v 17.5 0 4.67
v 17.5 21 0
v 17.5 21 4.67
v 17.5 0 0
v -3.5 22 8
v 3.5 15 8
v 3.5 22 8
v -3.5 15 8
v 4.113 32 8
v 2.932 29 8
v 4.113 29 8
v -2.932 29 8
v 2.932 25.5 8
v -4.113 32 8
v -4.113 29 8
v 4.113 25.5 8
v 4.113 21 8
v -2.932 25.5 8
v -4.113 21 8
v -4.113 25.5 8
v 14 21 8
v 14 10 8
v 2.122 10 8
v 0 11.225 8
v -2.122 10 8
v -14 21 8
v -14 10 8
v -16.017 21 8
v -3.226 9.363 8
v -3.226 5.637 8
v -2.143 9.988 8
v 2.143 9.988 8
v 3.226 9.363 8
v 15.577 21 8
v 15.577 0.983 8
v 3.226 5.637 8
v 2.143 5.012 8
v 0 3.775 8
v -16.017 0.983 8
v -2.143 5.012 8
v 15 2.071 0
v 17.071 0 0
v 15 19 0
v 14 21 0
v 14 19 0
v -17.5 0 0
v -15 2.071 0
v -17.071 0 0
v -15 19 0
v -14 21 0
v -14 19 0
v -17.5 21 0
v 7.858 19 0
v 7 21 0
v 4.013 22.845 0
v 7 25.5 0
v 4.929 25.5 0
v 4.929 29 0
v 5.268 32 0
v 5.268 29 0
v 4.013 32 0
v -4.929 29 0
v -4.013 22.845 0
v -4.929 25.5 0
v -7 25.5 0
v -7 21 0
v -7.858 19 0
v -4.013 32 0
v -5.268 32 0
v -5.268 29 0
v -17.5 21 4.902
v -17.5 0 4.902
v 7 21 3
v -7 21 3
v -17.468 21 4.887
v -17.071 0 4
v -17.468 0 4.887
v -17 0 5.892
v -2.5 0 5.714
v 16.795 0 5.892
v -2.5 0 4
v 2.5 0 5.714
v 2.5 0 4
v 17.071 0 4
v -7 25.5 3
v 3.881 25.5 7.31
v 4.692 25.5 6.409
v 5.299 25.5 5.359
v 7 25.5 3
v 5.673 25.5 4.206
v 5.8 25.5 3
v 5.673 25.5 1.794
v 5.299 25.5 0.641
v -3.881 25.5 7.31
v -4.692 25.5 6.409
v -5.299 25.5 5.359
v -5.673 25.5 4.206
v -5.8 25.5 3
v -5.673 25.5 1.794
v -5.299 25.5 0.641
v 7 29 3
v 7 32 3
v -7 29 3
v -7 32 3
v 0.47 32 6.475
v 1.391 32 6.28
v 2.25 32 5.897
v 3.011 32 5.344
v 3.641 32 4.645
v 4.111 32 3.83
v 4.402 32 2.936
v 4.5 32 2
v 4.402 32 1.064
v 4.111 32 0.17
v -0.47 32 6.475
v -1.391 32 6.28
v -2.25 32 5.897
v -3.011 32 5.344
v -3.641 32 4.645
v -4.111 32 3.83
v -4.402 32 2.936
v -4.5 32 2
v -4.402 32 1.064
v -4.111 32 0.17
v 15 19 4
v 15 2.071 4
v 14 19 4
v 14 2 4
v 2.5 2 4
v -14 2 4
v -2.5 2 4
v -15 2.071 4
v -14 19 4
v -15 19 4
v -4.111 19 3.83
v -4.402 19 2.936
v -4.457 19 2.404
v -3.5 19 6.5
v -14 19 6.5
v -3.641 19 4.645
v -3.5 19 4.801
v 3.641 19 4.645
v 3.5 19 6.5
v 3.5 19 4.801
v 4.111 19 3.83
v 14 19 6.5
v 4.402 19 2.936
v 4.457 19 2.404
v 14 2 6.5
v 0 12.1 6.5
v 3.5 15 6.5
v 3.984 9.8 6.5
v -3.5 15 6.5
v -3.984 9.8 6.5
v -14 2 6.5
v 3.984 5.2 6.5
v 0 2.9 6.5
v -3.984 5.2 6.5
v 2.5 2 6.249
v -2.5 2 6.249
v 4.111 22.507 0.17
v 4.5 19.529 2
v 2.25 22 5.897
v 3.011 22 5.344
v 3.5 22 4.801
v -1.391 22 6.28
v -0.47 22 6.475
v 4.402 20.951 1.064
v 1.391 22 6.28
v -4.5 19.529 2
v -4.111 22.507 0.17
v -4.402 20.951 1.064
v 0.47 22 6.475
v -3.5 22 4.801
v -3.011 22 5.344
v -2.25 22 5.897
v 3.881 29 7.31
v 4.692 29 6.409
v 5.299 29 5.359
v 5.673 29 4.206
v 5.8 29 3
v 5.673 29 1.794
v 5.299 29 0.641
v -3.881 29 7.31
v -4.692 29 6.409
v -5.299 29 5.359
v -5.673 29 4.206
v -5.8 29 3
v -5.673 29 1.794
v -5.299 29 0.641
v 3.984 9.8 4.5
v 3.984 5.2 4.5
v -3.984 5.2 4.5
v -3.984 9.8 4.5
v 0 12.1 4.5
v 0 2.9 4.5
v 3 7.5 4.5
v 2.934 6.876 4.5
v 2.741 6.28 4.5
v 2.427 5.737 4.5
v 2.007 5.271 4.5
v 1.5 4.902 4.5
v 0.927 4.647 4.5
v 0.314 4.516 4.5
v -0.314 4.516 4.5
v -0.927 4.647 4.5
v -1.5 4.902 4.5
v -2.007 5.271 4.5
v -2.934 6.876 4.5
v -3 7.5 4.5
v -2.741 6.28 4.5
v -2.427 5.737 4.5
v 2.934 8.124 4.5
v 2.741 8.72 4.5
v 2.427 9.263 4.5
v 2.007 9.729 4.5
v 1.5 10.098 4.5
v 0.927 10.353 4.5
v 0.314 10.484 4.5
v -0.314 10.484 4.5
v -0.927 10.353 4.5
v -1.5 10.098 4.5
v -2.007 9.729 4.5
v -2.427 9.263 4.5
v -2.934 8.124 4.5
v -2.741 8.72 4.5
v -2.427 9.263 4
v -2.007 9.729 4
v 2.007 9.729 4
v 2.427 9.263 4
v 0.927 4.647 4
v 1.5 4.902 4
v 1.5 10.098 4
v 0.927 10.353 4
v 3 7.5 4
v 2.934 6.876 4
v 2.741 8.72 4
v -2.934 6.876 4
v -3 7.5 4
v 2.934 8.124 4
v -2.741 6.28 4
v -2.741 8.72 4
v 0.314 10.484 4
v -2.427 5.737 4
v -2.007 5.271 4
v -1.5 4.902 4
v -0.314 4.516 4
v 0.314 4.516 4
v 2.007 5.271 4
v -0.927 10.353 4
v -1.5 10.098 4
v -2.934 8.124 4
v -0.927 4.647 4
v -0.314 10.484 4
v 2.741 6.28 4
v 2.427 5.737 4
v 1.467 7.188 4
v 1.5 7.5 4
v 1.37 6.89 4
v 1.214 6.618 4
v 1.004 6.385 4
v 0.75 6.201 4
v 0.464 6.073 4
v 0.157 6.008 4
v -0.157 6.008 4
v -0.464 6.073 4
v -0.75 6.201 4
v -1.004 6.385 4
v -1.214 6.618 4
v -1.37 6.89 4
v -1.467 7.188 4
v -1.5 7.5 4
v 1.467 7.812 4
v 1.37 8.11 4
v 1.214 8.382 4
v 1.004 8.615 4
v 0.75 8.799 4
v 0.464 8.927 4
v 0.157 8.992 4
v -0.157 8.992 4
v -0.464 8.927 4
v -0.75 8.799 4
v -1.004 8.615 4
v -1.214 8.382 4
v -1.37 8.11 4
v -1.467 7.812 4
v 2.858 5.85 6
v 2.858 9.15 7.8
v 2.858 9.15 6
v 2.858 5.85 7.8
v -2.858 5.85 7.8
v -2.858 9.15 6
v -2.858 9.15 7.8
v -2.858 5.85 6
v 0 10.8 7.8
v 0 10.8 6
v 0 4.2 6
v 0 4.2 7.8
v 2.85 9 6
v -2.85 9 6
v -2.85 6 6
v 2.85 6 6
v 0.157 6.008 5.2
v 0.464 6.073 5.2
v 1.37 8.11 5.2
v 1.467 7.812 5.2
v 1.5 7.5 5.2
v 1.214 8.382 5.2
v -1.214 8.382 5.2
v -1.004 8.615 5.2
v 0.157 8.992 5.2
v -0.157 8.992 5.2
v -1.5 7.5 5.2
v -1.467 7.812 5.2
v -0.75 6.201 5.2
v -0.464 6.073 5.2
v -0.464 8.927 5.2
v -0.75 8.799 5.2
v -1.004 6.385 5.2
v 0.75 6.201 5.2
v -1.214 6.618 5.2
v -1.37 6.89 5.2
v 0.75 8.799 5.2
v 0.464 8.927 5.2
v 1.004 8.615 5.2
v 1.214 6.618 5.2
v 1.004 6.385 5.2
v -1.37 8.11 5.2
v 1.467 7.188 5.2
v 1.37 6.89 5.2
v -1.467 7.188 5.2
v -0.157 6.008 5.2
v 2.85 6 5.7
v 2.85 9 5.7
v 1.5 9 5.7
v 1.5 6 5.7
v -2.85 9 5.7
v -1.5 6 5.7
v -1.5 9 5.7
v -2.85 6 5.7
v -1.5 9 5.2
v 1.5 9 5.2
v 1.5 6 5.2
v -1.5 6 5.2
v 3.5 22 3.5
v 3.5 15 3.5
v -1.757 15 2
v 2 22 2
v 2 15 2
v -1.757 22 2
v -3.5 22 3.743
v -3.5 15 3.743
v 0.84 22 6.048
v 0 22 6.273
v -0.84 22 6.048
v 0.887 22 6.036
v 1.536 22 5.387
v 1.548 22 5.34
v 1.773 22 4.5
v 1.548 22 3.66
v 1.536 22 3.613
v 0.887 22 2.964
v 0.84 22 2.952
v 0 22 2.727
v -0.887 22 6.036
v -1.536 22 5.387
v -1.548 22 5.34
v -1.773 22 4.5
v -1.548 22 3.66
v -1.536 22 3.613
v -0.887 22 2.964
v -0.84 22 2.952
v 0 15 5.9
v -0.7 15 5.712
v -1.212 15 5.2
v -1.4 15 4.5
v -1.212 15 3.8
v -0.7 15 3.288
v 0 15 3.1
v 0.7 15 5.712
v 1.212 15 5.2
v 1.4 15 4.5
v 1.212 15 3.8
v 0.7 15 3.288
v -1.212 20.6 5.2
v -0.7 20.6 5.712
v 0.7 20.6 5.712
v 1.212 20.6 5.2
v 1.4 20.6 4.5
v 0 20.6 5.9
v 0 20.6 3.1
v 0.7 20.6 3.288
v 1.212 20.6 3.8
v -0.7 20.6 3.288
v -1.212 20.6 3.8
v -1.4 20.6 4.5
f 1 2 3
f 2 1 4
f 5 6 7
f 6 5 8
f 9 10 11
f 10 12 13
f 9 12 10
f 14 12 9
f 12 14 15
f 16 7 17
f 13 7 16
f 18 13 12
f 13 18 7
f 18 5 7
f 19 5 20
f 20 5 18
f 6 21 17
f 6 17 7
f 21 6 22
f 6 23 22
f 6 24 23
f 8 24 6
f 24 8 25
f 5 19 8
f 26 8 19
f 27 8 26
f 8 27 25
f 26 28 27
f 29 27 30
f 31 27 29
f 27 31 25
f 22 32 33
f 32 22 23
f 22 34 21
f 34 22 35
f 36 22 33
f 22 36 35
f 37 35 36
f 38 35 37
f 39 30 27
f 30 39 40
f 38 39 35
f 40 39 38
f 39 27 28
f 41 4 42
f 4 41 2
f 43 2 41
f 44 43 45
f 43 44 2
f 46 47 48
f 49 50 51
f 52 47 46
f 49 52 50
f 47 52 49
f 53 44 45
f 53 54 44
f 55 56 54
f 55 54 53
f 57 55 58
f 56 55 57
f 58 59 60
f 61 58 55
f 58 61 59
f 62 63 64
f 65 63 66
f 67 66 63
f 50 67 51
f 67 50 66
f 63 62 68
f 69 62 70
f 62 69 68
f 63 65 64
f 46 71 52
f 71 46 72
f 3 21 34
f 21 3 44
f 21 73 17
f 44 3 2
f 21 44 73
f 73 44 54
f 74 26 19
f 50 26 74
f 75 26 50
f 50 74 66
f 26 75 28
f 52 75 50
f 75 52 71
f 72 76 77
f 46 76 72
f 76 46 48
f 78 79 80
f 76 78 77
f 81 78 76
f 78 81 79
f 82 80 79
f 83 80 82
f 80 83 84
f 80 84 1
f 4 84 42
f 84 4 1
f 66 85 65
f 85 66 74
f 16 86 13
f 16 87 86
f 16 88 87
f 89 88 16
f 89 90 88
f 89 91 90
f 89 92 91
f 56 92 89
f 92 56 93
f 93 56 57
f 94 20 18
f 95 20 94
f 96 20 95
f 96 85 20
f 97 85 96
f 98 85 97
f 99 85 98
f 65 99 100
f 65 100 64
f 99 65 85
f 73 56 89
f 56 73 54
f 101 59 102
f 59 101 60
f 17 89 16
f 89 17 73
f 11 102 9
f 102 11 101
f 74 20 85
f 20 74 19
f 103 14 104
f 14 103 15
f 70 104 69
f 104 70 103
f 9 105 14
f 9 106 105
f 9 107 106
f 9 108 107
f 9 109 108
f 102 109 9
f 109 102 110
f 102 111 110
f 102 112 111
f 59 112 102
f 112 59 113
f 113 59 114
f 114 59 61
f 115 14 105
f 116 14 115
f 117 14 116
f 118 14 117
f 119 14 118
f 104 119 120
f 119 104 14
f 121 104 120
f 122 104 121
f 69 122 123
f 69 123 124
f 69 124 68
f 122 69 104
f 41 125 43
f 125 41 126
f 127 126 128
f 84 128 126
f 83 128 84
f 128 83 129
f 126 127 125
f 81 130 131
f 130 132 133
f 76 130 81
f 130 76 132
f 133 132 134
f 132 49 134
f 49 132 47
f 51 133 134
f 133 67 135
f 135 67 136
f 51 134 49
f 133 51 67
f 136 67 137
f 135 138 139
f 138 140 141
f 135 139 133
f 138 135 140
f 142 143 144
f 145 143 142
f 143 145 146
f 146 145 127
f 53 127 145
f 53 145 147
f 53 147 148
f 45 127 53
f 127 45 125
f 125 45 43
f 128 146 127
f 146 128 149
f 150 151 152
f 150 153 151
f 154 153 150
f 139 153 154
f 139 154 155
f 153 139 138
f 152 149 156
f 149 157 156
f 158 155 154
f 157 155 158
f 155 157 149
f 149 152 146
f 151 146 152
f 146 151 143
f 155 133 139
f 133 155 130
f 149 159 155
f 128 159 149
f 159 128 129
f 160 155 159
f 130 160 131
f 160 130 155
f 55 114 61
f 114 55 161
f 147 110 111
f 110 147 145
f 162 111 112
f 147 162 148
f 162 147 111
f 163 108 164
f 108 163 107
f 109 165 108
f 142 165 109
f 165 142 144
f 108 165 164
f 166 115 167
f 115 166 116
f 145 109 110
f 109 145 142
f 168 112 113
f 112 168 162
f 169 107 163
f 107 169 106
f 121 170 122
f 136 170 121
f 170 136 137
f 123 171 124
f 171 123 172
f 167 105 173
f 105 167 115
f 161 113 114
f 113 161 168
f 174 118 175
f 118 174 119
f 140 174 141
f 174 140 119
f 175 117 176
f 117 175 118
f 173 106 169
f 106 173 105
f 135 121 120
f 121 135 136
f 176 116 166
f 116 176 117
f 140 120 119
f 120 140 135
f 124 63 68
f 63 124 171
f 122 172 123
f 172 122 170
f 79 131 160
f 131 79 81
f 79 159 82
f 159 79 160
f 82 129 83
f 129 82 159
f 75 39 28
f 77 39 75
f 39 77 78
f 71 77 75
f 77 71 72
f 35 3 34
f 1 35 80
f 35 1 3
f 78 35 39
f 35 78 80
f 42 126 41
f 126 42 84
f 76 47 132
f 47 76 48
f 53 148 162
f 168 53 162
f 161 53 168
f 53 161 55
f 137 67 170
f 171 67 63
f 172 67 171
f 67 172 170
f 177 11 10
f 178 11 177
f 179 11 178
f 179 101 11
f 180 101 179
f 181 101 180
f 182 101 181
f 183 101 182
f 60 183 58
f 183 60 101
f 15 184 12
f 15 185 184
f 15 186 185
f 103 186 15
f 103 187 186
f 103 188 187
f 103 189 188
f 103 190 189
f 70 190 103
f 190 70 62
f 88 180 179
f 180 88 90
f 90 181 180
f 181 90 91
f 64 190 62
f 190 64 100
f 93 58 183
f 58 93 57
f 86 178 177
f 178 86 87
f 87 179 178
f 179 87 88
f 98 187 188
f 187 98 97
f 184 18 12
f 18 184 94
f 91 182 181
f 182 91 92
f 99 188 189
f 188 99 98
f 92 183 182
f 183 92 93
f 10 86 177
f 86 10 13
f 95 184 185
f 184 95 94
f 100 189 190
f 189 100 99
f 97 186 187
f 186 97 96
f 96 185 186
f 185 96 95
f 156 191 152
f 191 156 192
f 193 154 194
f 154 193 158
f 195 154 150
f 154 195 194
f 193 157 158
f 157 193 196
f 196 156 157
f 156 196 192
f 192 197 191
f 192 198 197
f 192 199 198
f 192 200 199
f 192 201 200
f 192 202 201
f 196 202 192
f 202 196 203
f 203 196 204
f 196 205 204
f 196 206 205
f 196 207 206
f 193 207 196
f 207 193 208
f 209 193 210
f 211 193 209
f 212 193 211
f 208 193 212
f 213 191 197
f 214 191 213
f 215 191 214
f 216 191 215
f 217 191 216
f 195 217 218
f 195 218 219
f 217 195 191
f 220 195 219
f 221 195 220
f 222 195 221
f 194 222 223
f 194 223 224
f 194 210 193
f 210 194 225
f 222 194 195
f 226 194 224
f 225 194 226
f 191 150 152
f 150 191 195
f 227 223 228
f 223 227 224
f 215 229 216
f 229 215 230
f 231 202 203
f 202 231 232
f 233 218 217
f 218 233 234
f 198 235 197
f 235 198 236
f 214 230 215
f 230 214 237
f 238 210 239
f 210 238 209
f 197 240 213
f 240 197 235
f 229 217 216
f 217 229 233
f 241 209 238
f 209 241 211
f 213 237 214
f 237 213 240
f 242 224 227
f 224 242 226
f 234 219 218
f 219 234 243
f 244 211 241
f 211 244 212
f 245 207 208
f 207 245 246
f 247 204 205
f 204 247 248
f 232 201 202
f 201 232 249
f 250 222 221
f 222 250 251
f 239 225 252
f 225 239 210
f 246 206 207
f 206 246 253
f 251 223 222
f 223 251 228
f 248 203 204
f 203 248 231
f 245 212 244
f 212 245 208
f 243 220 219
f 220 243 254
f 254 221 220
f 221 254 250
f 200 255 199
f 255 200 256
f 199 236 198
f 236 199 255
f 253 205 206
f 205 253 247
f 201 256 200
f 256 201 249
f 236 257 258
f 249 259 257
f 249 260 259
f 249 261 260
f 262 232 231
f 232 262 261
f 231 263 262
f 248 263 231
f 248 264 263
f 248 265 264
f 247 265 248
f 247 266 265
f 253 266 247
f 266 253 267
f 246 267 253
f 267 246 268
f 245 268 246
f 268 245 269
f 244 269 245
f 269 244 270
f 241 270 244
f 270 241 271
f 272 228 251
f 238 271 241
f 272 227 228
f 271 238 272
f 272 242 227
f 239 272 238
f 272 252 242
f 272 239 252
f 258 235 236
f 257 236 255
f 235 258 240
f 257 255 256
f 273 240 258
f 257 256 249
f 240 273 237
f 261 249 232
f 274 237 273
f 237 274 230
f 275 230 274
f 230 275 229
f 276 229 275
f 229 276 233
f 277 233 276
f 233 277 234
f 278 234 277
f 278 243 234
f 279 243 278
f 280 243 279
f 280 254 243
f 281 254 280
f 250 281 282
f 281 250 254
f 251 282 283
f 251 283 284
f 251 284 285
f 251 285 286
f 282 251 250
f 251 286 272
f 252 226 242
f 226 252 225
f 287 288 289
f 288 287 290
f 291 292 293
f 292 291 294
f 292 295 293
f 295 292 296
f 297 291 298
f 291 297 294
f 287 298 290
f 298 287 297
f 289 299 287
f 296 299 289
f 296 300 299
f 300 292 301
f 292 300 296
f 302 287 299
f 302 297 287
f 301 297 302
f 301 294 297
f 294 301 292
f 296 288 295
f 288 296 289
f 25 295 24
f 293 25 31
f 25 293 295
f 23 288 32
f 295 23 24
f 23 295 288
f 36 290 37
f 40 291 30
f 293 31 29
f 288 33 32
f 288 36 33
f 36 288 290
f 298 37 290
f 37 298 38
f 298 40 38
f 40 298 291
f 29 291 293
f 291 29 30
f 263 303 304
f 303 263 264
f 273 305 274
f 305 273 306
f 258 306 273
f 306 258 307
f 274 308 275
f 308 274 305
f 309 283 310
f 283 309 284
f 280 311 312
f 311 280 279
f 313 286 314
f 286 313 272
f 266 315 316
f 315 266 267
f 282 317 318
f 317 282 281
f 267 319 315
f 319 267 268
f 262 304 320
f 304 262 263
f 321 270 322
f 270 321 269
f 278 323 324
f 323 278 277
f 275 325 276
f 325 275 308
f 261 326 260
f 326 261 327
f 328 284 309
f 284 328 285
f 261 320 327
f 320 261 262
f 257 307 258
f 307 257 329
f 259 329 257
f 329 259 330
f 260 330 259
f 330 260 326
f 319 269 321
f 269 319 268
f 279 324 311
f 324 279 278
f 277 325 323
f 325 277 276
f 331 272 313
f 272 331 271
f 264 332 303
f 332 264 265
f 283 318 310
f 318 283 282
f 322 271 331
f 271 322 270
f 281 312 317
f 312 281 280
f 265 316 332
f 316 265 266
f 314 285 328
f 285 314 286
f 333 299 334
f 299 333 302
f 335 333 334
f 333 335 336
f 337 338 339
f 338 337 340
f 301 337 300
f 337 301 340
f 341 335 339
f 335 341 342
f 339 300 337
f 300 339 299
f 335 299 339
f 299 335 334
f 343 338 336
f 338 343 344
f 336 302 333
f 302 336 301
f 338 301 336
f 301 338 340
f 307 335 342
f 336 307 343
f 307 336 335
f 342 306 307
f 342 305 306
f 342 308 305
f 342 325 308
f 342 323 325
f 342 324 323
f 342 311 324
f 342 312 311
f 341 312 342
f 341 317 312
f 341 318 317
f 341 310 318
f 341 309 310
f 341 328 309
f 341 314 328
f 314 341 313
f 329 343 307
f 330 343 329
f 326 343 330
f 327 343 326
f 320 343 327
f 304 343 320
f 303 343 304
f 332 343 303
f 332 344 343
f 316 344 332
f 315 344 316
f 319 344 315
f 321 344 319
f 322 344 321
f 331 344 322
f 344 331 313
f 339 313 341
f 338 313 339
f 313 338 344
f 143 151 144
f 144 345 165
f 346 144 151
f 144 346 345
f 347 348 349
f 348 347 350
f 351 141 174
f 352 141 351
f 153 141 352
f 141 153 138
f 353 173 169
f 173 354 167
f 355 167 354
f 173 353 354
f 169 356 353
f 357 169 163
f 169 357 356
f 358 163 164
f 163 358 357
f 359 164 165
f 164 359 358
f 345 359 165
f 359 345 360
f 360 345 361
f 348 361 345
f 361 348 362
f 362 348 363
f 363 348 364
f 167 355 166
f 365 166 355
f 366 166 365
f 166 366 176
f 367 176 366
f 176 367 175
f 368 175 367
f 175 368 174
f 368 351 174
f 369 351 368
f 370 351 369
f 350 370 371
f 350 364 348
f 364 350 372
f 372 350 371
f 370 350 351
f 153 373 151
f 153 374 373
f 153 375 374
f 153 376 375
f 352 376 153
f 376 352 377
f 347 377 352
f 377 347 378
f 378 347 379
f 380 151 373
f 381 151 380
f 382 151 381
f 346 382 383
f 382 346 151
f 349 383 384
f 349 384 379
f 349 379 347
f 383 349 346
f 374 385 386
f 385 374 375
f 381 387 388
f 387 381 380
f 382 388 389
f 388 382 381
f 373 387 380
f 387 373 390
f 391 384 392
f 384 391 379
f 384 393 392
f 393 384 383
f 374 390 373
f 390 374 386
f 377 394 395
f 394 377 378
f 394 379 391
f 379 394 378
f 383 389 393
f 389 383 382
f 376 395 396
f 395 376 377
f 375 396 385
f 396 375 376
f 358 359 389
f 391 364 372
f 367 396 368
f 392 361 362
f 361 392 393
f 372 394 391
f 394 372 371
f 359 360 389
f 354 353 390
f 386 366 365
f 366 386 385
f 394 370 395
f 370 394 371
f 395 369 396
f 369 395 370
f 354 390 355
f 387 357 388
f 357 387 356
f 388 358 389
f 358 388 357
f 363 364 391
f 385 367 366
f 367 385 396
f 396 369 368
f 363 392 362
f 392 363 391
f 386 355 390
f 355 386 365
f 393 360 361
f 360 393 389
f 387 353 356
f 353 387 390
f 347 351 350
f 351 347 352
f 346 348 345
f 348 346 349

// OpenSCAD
// PRUSA iteration4
// Heatbed cable cover
// GNU GPL v3
// Josef Průša <iam@josefprusa.cz> and contributors
// http://www.reprap.org/wiki/Prusa_Mendel
// http://prusamendel.org


module cover()
{
    translate([ -17.5, 0, 0 ]) cube([ 35, 21, 8 ]);  // cover
    translate([ -7, 19, 0 ]) cube([ 3, 6.5, 3 ]);  // tube reinforcement
    translate([ 4, 19, 0 ]) cube([ 3, 6.5, 3 ]);  // tube reinforcement
    translate( [ 0 , 32 , 3 ] ) rotate( [90,0,0] ) cylinder( h = 12, r = 7, $fn=6);  // cable tube outer
}

module inside_cut()
{
    translate([ -15, -1, -1 ]) cube( [30,20,5] );     // inside cut
    translate([ -14, 2, 4 ])  cube( [28,17,2.5 ] );     // inside cut
    
    translate( [ 0 , 32 , 2 ] ) rotate( [90,0,0] ) cylinder( h = 16, r = 4.5, $fn=30);  // cable tube inner
    
    translate([ -14, 10, -5 ])  cube( [28,25,5 ] );     // inside cut
    translate([ -14, 10, 8 ])  cube( [28,25,3 ] );     // inside cut
    
    translate([ -2.5, -6, 1 ])  rotate([15,0,0]) cube( [5,10,3 ] );     // LED
    
    translate([ -22, -5, 7 ]) rotate([0,25,0])  cube( [5,40,6 ] );     // corners
    translate([ 15, -5, 9 ]) rotate([0,60,0])  cube( [6,40,5 ] );     // corners
    translate([ 20, -5, 7 ]) rotate([0,25,90])  cube( [5,40,5 ] );     // corners
    
    translate([ 15, -5, -1 ]) rotate([0,0,45])  cube( [5,5,5 ] );     // corners
    translate([ -15, -5, -1 ]) rotate([0,0,45])  cube( [5,5,5 ] );     // corners
    
    
    translate([ 8, 13, -10]) rotate([0,-45,45])  cube( [10,10,10 ] );     // corners
    translate([ -8, 13, -10]) rotate([0,-45,-45])  cube( [10,10,10 ] );     // corners

}

module ziptie()
{
        difference()
        {
            translate( [ 0 , 29 , 3 ] ) rotate( [90,0,0] ) cylinder( h = 3.5, r = 10, $fn=30);  // cable tube outer
            translate( [ 0 , 29 , 3 ] ) rotate( [90,0,0] ) cylinder( h = 3.5, r = 5.8, $fn=30);  // cable tube outer
        }
}

module filament_holder()
{
        difference(){
        translate([ -3.5,15, 2 ]) rotate([0,0,0])  cube( [7,7,6 ] );     // body ; 
        translate( [ 0 , 24 , 4.5 ] ) rotate( [90,0,0] ) cylinder( h = 10, r = 1.4, $fn=12);  // filament
        translate( [ 0 , 22.1 , 4.5 ] ) rotate( [90,0,0] ) cylinder( h = 1.5, r1 = 1.8, r2=1.4, $fn=12);  // filament

        translate([ -6,15, 2 ]) rotate([0,45,0])  cube( [4,15,3 ] );     // corners ; previous ([ -5,15, 1 ]) cube( [3,15,3 ] )           
        translate([ 1,15, 1 ]) rotate([0,45,0])  cube( [3,15,4 ] );     // corners ; previous  cube( [3,15,3 ] ) 
        }
}

module m3_screw()
{
        
    translate( [ 0 , 7.5 , 6 ] ) rotate( [0,0,90] ) cylinder( h = 2.5, r = 3.3, $fn=6);  // M3 HEAD
    translate( [ 0 , 7.5 , 7.8] ) rotate( [0,0,90] ) cylinder( h = 0.8, r1 = 3.3, r2=5, $fn=6);  // M3 HEAD
    translate( [ 0 , 7.5 , -10 ] ) rotate( [0,0,0] ) cylinder( h = 20, r = 1.5, $fn=30);  // M3 thread
}
    
module nut_trap()
{
    translate( [ 0 , 7.5 , 4.5 ] ) rotate( [0,0,90] ) cylinder( h = 2.5, r = 4.6, $fn=6);  // M3 HEAD
    translate( [ 0 , 7.5 , 4 ] ) rotate( [0,0,0] ) cylinder( h = 1, r = 3, $fn=30);    
}
    
difference()
{
    union()
    {
        difference()
        {
            cover();
            inside_cut();
            ziptie();
        }
        nut_trap();
    }   
    m3_screw();
    translate( [ 0 , 7.5 , 6.2 ] ) rotate( [0,0,0] ) cube( [5.7,3,1], center=true);   
    translate( [ 0 , 7.5 , 5.7 ] ) rotate( [0,0,0] ) cube( [3,3,1], center=true); 
}
    
filament_holder();
    
